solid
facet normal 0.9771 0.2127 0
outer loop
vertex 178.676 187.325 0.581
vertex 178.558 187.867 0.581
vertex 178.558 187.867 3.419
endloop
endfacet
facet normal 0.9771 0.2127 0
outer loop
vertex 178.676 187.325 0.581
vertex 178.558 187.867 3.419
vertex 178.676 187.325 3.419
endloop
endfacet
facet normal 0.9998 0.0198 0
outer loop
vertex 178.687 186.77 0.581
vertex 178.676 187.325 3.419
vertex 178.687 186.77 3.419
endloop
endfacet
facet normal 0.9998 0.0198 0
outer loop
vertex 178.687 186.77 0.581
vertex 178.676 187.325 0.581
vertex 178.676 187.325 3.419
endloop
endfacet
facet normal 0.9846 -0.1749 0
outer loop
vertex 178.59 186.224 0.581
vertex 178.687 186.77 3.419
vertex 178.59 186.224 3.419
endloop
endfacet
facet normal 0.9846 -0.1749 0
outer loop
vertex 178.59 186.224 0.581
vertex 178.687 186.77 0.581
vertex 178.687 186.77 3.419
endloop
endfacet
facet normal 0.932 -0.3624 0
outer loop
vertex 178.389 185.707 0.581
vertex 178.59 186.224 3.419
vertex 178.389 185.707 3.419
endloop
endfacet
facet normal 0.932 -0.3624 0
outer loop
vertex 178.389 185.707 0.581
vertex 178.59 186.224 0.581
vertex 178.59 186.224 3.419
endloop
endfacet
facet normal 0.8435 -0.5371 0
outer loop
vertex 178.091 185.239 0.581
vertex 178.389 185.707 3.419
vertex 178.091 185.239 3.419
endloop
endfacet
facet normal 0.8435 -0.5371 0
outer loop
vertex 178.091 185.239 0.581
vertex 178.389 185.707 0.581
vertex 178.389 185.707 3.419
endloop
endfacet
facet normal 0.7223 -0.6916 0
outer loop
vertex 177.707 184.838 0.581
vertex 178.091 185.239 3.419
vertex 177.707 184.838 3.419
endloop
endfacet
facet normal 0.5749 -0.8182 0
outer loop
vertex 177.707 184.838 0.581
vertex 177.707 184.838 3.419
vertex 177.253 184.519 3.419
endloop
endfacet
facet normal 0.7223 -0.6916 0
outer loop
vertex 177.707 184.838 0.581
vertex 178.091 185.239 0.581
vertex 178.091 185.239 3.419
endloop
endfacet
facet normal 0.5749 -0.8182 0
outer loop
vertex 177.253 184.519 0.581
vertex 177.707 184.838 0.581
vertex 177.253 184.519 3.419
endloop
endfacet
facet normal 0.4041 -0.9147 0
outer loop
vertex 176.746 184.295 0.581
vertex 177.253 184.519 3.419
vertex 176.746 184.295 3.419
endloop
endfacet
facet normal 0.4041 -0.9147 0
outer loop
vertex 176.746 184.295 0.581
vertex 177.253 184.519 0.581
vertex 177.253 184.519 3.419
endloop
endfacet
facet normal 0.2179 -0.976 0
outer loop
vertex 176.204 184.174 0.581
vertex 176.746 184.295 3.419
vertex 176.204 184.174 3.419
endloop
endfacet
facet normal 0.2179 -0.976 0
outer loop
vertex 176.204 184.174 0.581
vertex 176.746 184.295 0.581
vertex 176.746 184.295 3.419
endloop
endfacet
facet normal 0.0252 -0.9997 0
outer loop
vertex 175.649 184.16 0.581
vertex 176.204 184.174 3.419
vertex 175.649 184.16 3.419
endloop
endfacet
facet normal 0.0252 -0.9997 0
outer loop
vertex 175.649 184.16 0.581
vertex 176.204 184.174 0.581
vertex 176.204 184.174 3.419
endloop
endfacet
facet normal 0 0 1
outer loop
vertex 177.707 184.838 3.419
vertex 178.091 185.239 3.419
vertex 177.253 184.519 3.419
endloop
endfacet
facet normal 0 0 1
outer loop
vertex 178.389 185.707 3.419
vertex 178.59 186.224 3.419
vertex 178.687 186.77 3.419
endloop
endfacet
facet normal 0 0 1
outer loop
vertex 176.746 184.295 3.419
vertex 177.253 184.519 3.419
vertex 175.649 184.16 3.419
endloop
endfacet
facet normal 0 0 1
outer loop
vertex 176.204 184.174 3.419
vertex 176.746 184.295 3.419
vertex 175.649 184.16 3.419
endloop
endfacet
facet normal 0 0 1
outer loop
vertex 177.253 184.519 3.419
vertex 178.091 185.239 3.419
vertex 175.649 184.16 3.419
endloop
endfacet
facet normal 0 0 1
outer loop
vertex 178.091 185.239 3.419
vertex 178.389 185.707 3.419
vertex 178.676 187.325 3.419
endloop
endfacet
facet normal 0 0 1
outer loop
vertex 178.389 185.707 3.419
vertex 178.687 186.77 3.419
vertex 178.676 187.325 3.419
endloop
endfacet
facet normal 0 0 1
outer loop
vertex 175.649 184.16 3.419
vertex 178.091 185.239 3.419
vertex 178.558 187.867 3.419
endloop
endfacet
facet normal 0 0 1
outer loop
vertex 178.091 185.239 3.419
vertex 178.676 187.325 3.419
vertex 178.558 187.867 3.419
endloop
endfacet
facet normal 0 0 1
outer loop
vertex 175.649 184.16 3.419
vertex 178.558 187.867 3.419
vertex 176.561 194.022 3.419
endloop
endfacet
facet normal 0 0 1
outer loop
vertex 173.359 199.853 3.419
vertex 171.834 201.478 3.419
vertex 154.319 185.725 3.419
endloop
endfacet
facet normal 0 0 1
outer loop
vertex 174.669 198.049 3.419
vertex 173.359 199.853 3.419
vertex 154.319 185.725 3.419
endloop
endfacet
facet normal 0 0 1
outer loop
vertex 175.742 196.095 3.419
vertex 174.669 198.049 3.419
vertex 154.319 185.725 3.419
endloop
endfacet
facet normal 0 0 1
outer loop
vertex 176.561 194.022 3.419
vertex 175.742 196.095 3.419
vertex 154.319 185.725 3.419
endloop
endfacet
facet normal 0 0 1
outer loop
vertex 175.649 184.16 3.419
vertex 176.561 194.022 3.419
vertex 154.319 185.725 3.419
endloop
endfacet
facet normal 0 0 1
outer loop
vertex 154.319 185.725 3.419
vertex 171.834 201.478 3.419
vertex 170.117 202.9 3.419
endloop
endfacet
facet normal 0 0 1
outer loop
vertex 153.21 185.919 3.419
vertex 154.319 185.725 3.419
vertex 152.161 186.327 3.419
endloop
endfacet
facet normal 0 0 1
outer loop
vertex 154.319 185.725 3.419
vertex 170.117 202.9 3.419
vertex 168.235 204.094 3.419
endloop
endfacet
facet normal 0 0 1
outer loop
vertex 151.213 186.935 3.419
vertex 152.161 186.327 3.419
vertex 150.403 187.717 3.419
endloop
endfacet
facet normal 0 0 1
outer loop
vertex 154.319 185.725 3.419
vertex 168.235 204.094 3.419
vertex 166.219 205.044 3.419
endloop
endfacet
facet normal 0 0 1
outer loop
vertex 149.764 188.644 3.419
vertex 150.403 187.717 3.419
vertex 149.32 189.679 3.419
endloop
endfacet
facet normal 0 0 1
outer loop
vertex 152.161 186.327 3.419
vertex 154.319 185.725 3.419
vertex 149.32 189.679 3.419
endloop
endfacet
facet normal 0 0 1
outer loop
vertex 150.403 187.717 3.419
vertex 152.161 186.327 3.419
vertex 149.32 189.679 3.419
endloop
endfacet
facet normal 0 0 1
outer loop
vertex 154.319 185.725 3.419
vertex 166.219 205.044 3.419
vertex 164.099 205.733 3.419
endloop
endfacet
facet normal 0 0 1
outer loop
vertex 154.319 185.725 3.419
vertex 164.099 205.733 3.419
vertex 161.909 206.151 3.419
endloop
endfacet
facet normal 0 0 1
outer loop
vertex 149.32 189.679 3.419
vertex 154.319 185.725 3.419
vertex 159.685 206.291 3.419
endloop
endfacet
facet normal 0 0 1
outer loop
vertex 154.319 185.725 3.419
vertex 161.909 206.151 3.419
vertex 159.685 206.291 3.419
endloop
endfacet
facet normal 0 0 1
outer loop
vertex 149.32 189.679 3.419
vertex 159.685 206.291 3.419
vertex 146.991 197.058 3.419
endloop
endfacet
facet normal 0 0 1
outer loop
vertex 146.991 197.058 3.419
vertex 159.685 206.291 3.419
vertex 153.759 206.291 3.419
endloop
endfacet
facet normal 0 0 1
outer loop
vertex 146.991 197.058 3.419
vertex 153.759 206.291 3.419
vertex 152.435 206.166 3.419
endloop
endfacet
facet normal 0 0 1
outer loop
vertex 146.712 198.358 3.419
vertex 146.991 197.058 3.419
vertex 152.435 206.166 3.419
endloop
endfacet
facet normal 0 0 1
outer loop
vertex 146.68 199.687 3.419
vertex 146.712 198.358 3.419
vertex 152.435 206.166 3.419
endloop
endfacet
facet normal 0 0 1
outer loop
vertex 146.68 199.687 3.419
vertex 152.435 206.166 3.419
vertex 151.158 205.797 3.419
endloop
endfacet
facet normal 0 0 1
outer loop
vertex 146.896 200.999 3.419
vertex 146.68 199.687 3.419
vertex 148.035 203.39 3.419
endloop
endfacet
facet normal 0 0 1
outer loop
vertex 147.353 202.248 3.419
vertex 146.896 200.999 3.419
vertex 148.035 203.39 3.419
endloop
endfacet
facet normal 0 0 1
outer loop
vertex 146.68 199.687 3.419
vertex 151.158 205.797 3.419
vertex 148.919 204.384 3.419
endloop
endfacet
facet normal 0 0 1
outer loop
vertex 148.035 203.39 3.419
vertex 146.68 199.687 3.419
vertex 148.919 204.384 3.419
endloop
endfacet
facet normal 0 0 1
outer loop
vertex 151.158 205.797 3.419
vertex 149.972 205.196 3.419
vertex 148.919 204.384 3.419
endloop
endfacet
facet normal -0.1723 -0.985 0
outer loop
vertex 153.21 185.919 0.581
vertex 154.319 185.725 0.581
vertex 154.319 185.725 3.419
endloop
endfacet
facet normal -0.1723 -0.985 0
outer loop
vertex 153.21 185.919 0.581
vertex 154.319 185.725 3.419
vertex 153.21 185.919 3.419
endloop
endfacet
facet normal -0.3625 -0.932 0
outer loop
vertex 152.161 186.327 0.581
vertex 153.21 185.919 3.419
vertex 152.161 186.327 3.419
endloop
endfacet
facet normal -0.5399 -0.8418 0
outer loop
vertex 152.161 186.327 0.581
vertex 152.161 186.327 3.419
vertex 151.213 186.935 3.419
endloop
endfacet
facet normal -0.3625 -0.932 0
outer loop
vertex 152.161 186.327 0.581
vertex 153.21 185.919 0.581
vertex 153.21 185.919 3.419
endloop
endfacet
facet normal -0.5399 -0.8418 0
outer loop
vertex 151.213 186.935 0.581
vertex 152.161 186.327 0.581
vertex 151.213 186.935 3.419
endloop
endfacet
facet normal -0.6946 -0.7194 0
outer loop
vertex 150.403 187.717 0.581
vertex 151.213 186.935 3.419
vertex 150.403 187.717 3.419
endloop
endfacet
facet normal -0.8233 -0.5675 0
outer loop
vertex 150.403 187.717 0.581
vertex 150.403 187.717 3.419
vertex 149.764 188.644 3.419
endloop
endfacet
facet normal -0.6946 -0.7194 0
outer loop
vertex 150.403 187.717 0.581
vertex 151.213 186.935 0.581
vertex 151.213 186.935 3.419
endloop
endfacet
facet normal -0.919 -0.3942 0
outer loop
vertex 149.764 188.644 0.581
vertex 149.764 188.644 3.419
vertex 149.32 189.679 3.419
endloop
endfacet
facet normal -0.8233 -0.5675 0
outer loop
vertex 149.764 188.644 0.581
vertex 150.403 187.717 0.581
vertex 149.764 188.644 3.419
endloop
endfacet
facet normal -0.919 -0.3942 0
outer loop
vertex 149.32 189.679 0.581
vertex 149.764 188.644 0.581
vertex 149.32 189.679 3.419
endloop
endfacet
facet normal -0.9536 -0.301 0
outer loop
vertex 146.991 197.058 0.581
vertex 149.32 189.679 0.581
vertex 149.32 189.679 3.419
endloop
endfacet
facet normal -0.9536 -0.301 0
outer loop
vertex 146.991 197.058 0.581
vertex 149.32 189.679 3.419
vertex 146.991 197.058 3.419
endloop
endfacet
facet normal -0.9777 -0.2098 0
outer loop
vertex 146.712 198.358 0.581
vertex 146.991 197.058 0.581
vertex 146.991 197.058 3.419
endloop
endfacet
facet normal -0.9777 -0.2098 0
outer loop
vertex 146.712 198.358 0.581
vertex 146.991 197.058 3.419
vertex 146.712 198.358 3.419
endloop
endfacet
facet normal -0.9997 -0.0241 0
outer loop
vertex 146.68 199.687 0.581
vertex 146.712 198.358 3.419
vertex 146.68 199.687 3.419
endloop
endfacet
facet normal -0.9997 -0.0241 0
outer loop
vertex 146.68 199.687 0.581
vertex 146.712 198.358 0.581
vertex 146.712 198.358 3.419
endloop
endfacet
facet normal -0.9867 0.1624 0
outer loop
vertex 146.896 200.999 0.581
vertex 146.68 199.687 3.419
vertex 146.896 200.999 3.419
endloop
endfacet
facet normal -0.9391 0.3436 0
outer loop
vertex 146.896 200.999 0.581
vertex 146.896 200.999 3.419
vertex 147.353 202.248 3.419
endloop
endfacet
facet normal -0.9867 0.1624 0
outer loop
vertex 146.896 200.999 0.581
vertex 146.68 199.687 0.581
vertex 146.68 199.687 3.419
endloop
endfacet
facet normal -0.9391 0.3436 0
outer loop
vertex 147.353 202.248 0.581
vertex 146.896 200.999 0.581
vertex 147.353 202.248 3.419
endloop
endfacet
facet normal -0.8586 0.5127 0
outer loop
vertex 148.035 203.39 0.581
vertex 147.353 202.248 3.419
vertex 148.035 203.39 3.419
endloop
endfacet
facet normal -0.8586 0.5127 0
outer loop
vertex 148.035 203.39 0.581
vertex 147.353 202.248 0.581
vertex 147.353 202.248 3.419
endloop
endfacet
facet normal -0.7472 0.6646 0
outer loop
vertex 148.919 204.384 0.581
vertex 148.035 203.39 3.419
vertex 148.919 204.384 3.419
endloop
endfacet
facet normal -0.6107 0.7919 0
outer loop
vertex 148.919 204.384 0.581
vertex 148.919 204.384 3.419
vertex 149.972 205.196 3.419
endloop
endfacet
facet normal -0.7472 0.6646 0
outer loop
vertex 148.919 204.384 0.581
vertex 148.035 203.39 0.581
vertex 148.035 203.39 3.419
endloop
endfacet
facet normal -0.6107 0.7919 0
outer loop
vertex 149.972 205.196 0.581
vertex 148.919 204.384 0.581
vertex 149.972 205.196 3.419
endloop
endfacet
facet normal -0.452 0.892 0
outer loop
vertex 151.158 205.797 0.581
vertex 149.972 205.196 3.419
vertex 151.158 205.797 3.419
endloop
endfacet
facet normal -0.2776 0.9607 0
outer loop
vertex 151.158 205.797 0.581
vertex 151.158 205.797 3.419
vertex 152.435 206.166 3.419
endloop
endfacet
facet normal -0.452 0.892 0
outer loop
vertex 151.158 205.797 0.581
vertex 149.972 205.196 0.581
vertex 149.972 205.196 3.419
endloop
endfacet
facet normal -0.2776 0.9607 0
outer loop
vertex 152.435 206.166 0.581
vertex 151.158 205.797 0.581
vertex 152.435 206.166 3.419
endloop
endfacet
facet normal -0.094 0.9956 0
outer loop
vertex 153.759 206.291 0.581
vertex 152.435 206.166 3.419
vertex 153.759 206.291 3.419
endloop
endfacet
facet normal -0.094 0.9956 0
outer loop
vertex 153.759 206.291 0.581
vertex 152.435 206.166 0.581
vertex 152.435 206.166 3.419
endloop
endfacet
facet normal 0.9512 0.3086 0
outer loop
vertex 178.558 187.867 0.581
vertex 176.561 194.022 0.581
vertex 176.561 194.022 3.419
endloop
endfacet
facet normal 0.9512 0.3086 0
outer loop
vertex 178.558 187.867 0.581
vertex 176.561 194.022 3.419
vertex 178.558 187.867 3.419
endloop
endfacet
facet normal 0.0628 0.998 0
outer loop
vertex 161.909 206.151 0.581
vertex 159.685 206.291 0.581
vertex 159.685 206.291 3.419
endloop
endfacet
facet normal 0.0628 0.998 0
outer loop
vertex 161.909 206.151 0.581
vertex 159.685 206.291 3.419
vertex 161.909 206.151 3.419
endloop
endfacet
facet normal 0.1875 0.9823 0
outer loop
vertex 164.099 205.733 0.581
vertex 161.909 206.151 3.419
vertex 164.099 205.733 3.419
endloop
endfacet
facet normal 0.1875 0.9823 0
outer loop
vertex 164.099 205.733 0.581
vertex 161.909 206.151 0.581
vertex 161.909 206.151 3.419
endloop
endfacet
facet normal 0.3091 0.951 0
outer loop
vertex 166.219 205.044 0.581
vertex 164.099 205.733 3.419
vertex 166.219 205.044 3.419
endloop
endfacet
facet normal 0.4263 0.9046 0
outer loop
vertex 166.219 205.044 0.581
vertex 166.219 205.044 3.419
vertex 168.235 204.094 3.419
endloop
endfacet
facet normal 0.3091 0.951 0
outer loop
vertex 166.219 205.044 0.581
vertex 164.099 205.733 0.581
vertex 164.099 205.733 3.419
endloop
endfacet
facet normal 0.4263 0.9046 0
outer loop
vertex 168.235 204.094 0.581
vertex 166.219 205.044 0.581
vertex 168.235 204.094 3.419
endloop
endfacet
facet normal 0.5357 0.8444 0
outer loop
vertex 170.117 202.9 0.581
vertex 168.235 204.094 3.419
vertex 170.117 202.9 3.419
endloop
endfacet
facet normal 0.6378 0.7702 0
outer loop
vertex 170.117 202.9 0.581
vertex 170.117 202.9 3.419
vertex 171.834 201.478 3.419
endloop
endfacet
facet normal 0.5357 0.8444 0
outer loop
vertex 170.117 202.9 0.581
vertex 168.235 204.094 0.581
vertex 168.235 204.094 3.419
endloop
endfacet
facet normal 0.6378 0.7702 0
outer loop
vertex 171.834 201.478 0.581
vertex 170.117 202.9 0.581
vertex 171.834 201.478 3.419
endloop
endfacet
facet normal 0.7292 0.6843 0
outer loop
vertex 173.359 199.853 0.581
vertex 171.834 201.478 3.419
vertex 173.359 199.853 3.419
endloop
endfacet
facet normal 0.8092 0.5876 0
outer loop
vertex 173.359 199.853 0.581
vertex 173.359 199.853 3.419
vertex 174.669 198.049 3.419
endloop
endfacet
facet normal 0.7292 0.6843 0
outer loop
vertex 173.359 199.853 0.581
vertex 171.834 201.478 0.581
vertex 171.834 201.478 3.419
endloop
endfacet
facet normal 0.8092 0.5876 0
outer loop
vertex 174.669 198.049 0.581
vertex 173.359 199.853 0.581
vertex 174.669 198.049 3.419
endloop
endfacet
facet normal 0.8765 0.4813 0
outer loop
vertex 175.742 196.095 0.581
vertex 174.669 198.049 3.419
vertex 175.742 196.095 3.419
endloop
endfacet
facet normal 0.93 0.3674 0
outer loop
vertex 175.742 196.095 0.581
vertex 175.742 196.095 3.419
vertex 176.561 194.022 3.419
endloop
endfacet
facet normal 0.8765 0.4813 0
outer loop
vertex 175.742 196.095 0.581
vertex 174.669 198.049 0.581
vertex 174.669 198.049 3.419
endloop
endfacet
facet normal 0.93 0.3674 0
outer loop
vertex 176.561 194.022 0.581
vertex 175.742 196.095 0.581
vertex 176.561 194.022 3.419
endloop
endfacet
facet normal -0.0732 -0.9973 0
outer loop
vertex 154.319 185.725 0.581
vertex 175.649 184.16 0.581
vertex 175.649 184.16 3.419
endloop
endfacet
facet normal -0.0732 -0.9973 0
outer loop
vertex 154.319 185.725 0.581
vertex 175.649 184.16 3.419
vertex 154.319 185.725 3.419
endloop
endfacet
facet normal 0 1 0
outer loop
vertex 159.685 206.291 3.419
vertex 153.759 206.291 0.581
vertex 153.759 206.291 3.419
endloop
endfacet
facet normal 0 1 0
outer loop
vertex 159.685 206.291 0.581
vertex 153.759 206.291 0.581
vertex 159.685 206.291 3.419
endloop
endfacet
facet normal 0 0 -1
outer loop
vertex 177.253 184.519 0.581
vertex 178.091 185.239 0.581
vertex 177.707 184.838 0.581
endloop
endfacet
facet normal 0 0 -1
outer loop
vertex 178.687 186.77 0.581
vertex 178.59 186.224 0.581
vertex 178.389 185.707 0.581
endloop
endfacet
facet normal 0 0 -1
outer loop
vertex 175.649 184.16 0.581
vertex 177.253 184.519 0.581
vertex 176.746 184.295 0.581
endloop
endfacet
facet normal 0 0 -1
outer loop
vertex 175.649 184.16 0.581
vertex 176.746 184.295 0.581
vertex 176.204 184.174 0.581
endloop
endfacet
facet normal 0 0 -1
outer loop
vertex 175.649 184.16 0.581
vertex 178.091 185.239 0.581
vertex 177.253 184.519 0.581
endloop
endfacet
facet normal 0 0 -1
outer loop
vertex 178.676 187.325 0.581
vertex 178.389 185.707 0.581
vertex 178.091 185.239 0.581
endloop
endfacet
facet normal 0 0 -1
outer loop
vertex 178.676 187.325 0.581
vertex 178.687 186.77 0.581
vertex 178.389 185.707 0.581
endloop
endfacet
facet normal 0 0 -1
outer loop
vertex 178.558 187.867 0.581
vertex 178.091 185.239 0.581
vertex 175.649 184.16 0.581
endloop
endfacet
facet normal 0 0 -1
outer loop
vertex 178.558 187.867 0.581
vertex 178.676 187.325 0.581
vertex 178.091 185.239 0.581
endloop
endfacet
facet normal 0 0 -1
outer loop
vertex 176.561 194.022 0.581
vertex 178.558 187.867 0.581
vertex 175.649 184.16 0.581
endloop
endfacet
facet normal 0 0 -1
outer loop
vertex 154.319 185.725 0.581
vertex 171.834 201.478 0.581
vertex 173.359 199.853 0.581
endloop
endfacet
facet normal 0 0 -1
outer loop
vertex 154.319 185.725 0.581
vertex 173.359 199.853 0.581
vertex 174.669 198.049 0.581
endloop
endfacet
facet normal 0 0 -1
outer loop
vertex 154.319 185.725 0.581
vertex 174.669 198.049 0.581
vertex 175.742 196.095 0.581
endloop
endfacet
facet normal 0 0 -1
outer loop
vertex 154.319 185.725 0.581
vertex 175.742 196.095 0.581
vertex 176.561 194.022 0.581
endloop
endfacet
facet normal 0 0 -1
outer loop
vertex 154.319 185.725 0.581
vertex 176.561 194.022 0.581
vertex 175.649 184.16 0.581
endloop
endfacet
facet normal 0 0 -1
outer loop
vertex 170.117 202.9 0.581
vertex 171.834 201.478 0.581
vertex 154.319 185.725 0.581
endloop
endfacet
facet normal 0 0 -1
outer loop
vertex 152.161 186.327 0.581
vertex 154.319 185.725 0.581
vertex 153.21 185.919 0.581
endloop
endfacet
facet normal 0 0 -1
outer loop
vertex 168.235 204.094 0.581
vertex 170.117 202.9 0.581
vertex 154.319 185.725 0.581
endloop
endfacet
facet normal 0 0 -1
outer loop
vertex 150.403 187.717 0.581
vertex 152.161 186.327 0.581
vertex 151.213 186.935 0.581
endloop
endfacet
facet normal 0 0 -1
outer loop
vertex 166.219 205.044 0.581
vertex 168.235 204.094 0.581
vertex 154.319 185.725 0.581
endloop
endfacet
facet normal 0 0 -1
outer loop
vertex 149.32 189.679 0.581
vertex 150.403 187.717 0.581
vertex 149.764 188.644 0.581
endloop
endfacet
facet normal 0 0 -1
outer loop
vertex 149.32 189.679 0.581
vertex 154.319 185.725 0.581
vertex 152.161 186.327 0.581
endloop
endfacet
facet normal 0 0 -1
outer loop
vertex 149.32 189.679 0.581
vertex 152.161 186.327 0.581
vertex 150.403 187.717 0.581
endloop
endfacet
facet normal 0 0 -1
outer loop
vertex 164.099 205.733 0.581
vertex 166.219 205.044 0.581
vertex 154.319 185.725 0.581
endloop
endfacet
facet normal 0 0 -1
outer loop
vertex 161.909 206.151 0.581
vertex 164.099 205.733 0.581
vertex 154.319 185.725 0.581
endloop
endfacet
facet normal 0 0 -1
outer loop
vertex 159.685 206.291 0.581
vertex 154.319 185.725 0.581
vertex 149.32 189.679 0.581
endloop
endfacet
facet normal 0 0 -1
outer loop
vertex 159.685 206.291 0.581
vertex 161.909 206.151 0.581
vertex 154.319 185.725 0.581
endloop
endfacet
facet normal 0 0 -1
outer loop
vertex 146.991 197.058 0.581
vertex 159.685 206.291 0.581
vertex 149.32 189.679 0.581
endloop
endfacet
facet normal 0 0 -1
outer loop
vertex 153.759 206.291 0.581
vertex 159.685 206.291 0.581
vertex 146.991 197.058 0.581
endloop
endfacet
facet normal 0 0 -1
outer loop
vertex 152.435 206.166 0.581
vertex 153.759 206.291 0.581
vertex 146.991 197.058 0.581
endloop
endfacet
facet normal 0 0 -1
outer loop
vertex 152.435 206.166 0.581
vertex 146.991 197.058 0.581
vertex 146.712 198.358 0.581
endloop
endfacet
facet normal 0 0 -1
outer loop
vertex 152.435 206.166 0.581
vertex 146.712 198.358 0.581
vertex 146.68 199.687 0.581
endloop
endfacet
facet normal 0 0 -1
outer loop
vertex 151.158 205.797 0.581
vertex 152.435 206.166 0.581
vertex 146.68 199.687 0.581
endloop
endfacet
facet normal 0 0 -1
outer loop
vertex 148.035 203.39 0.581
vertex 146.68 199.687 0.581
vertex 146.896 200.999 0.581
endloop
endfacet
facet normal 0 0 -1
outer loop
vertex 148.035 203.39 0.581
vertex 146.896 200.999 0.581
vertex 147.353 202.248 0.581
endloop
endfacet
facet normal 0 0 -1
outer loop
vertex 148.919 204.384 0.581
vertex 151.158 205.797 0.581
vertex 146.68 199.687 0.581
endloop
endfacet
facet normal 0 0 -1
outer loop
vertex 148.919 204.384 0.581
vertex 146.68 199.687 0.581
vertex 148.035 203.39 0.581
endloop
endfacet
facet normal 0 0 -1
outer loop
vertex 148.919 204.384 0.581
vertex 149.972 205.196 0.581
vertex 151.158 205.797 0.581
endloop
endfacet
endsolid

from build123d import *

# Parameters (mm, degrees)
BOSS_EXTRUDE1_DEPTH = 4
SCALE1_SCALE        = 0.709677419


with BuildPart() as part:
    # Sketch1 → Boss-Extrude1 (new body)
    with BuildSketch(Plane.XY):
        with BuildLine():
            Line((150.379434294, 210.939689278), (158.72889788, 210.939689278))
            ThreePointArc((158.72889788, 210.939689278), (173.428975494, 206.161156043), (182.509468353, 193.652306729))
            Line((182.509468353, 193.652306729), (185.322557622, 184.978614816))
            ThreePointArc((185.322557622, 184.978614816), (184.66479187, 181.275668941), (181.2248759, 179.755326197))
            Line((181.2248759, 179.755326197), (151.16831456, 181.96131235))
            ThreePointArc((151.16831456, 181.96131235), (146.791215107, 183.665156491), (144.12485117, 187.532014108))
            Line((144.12485117, 187.532014108), (140.843128941, 197.929891907))
            ThreePointArc((140.843128941, 197.929891907), (142.314139082, 206.851627467), (150.379434294, 210.939689278))
        make_face()
    extrude(amount=BOSS_EXTRUDE1_DEPTH)


with BuildPart() as part_1:
    # Scale1: scaled about (162.020760572, 194.926645474, 2)
    add(part.part.scale(SCALE1_SCALE).moved(Location((47.038285327, 56.591606751, 0.580645161))))


solid = part_1.part
